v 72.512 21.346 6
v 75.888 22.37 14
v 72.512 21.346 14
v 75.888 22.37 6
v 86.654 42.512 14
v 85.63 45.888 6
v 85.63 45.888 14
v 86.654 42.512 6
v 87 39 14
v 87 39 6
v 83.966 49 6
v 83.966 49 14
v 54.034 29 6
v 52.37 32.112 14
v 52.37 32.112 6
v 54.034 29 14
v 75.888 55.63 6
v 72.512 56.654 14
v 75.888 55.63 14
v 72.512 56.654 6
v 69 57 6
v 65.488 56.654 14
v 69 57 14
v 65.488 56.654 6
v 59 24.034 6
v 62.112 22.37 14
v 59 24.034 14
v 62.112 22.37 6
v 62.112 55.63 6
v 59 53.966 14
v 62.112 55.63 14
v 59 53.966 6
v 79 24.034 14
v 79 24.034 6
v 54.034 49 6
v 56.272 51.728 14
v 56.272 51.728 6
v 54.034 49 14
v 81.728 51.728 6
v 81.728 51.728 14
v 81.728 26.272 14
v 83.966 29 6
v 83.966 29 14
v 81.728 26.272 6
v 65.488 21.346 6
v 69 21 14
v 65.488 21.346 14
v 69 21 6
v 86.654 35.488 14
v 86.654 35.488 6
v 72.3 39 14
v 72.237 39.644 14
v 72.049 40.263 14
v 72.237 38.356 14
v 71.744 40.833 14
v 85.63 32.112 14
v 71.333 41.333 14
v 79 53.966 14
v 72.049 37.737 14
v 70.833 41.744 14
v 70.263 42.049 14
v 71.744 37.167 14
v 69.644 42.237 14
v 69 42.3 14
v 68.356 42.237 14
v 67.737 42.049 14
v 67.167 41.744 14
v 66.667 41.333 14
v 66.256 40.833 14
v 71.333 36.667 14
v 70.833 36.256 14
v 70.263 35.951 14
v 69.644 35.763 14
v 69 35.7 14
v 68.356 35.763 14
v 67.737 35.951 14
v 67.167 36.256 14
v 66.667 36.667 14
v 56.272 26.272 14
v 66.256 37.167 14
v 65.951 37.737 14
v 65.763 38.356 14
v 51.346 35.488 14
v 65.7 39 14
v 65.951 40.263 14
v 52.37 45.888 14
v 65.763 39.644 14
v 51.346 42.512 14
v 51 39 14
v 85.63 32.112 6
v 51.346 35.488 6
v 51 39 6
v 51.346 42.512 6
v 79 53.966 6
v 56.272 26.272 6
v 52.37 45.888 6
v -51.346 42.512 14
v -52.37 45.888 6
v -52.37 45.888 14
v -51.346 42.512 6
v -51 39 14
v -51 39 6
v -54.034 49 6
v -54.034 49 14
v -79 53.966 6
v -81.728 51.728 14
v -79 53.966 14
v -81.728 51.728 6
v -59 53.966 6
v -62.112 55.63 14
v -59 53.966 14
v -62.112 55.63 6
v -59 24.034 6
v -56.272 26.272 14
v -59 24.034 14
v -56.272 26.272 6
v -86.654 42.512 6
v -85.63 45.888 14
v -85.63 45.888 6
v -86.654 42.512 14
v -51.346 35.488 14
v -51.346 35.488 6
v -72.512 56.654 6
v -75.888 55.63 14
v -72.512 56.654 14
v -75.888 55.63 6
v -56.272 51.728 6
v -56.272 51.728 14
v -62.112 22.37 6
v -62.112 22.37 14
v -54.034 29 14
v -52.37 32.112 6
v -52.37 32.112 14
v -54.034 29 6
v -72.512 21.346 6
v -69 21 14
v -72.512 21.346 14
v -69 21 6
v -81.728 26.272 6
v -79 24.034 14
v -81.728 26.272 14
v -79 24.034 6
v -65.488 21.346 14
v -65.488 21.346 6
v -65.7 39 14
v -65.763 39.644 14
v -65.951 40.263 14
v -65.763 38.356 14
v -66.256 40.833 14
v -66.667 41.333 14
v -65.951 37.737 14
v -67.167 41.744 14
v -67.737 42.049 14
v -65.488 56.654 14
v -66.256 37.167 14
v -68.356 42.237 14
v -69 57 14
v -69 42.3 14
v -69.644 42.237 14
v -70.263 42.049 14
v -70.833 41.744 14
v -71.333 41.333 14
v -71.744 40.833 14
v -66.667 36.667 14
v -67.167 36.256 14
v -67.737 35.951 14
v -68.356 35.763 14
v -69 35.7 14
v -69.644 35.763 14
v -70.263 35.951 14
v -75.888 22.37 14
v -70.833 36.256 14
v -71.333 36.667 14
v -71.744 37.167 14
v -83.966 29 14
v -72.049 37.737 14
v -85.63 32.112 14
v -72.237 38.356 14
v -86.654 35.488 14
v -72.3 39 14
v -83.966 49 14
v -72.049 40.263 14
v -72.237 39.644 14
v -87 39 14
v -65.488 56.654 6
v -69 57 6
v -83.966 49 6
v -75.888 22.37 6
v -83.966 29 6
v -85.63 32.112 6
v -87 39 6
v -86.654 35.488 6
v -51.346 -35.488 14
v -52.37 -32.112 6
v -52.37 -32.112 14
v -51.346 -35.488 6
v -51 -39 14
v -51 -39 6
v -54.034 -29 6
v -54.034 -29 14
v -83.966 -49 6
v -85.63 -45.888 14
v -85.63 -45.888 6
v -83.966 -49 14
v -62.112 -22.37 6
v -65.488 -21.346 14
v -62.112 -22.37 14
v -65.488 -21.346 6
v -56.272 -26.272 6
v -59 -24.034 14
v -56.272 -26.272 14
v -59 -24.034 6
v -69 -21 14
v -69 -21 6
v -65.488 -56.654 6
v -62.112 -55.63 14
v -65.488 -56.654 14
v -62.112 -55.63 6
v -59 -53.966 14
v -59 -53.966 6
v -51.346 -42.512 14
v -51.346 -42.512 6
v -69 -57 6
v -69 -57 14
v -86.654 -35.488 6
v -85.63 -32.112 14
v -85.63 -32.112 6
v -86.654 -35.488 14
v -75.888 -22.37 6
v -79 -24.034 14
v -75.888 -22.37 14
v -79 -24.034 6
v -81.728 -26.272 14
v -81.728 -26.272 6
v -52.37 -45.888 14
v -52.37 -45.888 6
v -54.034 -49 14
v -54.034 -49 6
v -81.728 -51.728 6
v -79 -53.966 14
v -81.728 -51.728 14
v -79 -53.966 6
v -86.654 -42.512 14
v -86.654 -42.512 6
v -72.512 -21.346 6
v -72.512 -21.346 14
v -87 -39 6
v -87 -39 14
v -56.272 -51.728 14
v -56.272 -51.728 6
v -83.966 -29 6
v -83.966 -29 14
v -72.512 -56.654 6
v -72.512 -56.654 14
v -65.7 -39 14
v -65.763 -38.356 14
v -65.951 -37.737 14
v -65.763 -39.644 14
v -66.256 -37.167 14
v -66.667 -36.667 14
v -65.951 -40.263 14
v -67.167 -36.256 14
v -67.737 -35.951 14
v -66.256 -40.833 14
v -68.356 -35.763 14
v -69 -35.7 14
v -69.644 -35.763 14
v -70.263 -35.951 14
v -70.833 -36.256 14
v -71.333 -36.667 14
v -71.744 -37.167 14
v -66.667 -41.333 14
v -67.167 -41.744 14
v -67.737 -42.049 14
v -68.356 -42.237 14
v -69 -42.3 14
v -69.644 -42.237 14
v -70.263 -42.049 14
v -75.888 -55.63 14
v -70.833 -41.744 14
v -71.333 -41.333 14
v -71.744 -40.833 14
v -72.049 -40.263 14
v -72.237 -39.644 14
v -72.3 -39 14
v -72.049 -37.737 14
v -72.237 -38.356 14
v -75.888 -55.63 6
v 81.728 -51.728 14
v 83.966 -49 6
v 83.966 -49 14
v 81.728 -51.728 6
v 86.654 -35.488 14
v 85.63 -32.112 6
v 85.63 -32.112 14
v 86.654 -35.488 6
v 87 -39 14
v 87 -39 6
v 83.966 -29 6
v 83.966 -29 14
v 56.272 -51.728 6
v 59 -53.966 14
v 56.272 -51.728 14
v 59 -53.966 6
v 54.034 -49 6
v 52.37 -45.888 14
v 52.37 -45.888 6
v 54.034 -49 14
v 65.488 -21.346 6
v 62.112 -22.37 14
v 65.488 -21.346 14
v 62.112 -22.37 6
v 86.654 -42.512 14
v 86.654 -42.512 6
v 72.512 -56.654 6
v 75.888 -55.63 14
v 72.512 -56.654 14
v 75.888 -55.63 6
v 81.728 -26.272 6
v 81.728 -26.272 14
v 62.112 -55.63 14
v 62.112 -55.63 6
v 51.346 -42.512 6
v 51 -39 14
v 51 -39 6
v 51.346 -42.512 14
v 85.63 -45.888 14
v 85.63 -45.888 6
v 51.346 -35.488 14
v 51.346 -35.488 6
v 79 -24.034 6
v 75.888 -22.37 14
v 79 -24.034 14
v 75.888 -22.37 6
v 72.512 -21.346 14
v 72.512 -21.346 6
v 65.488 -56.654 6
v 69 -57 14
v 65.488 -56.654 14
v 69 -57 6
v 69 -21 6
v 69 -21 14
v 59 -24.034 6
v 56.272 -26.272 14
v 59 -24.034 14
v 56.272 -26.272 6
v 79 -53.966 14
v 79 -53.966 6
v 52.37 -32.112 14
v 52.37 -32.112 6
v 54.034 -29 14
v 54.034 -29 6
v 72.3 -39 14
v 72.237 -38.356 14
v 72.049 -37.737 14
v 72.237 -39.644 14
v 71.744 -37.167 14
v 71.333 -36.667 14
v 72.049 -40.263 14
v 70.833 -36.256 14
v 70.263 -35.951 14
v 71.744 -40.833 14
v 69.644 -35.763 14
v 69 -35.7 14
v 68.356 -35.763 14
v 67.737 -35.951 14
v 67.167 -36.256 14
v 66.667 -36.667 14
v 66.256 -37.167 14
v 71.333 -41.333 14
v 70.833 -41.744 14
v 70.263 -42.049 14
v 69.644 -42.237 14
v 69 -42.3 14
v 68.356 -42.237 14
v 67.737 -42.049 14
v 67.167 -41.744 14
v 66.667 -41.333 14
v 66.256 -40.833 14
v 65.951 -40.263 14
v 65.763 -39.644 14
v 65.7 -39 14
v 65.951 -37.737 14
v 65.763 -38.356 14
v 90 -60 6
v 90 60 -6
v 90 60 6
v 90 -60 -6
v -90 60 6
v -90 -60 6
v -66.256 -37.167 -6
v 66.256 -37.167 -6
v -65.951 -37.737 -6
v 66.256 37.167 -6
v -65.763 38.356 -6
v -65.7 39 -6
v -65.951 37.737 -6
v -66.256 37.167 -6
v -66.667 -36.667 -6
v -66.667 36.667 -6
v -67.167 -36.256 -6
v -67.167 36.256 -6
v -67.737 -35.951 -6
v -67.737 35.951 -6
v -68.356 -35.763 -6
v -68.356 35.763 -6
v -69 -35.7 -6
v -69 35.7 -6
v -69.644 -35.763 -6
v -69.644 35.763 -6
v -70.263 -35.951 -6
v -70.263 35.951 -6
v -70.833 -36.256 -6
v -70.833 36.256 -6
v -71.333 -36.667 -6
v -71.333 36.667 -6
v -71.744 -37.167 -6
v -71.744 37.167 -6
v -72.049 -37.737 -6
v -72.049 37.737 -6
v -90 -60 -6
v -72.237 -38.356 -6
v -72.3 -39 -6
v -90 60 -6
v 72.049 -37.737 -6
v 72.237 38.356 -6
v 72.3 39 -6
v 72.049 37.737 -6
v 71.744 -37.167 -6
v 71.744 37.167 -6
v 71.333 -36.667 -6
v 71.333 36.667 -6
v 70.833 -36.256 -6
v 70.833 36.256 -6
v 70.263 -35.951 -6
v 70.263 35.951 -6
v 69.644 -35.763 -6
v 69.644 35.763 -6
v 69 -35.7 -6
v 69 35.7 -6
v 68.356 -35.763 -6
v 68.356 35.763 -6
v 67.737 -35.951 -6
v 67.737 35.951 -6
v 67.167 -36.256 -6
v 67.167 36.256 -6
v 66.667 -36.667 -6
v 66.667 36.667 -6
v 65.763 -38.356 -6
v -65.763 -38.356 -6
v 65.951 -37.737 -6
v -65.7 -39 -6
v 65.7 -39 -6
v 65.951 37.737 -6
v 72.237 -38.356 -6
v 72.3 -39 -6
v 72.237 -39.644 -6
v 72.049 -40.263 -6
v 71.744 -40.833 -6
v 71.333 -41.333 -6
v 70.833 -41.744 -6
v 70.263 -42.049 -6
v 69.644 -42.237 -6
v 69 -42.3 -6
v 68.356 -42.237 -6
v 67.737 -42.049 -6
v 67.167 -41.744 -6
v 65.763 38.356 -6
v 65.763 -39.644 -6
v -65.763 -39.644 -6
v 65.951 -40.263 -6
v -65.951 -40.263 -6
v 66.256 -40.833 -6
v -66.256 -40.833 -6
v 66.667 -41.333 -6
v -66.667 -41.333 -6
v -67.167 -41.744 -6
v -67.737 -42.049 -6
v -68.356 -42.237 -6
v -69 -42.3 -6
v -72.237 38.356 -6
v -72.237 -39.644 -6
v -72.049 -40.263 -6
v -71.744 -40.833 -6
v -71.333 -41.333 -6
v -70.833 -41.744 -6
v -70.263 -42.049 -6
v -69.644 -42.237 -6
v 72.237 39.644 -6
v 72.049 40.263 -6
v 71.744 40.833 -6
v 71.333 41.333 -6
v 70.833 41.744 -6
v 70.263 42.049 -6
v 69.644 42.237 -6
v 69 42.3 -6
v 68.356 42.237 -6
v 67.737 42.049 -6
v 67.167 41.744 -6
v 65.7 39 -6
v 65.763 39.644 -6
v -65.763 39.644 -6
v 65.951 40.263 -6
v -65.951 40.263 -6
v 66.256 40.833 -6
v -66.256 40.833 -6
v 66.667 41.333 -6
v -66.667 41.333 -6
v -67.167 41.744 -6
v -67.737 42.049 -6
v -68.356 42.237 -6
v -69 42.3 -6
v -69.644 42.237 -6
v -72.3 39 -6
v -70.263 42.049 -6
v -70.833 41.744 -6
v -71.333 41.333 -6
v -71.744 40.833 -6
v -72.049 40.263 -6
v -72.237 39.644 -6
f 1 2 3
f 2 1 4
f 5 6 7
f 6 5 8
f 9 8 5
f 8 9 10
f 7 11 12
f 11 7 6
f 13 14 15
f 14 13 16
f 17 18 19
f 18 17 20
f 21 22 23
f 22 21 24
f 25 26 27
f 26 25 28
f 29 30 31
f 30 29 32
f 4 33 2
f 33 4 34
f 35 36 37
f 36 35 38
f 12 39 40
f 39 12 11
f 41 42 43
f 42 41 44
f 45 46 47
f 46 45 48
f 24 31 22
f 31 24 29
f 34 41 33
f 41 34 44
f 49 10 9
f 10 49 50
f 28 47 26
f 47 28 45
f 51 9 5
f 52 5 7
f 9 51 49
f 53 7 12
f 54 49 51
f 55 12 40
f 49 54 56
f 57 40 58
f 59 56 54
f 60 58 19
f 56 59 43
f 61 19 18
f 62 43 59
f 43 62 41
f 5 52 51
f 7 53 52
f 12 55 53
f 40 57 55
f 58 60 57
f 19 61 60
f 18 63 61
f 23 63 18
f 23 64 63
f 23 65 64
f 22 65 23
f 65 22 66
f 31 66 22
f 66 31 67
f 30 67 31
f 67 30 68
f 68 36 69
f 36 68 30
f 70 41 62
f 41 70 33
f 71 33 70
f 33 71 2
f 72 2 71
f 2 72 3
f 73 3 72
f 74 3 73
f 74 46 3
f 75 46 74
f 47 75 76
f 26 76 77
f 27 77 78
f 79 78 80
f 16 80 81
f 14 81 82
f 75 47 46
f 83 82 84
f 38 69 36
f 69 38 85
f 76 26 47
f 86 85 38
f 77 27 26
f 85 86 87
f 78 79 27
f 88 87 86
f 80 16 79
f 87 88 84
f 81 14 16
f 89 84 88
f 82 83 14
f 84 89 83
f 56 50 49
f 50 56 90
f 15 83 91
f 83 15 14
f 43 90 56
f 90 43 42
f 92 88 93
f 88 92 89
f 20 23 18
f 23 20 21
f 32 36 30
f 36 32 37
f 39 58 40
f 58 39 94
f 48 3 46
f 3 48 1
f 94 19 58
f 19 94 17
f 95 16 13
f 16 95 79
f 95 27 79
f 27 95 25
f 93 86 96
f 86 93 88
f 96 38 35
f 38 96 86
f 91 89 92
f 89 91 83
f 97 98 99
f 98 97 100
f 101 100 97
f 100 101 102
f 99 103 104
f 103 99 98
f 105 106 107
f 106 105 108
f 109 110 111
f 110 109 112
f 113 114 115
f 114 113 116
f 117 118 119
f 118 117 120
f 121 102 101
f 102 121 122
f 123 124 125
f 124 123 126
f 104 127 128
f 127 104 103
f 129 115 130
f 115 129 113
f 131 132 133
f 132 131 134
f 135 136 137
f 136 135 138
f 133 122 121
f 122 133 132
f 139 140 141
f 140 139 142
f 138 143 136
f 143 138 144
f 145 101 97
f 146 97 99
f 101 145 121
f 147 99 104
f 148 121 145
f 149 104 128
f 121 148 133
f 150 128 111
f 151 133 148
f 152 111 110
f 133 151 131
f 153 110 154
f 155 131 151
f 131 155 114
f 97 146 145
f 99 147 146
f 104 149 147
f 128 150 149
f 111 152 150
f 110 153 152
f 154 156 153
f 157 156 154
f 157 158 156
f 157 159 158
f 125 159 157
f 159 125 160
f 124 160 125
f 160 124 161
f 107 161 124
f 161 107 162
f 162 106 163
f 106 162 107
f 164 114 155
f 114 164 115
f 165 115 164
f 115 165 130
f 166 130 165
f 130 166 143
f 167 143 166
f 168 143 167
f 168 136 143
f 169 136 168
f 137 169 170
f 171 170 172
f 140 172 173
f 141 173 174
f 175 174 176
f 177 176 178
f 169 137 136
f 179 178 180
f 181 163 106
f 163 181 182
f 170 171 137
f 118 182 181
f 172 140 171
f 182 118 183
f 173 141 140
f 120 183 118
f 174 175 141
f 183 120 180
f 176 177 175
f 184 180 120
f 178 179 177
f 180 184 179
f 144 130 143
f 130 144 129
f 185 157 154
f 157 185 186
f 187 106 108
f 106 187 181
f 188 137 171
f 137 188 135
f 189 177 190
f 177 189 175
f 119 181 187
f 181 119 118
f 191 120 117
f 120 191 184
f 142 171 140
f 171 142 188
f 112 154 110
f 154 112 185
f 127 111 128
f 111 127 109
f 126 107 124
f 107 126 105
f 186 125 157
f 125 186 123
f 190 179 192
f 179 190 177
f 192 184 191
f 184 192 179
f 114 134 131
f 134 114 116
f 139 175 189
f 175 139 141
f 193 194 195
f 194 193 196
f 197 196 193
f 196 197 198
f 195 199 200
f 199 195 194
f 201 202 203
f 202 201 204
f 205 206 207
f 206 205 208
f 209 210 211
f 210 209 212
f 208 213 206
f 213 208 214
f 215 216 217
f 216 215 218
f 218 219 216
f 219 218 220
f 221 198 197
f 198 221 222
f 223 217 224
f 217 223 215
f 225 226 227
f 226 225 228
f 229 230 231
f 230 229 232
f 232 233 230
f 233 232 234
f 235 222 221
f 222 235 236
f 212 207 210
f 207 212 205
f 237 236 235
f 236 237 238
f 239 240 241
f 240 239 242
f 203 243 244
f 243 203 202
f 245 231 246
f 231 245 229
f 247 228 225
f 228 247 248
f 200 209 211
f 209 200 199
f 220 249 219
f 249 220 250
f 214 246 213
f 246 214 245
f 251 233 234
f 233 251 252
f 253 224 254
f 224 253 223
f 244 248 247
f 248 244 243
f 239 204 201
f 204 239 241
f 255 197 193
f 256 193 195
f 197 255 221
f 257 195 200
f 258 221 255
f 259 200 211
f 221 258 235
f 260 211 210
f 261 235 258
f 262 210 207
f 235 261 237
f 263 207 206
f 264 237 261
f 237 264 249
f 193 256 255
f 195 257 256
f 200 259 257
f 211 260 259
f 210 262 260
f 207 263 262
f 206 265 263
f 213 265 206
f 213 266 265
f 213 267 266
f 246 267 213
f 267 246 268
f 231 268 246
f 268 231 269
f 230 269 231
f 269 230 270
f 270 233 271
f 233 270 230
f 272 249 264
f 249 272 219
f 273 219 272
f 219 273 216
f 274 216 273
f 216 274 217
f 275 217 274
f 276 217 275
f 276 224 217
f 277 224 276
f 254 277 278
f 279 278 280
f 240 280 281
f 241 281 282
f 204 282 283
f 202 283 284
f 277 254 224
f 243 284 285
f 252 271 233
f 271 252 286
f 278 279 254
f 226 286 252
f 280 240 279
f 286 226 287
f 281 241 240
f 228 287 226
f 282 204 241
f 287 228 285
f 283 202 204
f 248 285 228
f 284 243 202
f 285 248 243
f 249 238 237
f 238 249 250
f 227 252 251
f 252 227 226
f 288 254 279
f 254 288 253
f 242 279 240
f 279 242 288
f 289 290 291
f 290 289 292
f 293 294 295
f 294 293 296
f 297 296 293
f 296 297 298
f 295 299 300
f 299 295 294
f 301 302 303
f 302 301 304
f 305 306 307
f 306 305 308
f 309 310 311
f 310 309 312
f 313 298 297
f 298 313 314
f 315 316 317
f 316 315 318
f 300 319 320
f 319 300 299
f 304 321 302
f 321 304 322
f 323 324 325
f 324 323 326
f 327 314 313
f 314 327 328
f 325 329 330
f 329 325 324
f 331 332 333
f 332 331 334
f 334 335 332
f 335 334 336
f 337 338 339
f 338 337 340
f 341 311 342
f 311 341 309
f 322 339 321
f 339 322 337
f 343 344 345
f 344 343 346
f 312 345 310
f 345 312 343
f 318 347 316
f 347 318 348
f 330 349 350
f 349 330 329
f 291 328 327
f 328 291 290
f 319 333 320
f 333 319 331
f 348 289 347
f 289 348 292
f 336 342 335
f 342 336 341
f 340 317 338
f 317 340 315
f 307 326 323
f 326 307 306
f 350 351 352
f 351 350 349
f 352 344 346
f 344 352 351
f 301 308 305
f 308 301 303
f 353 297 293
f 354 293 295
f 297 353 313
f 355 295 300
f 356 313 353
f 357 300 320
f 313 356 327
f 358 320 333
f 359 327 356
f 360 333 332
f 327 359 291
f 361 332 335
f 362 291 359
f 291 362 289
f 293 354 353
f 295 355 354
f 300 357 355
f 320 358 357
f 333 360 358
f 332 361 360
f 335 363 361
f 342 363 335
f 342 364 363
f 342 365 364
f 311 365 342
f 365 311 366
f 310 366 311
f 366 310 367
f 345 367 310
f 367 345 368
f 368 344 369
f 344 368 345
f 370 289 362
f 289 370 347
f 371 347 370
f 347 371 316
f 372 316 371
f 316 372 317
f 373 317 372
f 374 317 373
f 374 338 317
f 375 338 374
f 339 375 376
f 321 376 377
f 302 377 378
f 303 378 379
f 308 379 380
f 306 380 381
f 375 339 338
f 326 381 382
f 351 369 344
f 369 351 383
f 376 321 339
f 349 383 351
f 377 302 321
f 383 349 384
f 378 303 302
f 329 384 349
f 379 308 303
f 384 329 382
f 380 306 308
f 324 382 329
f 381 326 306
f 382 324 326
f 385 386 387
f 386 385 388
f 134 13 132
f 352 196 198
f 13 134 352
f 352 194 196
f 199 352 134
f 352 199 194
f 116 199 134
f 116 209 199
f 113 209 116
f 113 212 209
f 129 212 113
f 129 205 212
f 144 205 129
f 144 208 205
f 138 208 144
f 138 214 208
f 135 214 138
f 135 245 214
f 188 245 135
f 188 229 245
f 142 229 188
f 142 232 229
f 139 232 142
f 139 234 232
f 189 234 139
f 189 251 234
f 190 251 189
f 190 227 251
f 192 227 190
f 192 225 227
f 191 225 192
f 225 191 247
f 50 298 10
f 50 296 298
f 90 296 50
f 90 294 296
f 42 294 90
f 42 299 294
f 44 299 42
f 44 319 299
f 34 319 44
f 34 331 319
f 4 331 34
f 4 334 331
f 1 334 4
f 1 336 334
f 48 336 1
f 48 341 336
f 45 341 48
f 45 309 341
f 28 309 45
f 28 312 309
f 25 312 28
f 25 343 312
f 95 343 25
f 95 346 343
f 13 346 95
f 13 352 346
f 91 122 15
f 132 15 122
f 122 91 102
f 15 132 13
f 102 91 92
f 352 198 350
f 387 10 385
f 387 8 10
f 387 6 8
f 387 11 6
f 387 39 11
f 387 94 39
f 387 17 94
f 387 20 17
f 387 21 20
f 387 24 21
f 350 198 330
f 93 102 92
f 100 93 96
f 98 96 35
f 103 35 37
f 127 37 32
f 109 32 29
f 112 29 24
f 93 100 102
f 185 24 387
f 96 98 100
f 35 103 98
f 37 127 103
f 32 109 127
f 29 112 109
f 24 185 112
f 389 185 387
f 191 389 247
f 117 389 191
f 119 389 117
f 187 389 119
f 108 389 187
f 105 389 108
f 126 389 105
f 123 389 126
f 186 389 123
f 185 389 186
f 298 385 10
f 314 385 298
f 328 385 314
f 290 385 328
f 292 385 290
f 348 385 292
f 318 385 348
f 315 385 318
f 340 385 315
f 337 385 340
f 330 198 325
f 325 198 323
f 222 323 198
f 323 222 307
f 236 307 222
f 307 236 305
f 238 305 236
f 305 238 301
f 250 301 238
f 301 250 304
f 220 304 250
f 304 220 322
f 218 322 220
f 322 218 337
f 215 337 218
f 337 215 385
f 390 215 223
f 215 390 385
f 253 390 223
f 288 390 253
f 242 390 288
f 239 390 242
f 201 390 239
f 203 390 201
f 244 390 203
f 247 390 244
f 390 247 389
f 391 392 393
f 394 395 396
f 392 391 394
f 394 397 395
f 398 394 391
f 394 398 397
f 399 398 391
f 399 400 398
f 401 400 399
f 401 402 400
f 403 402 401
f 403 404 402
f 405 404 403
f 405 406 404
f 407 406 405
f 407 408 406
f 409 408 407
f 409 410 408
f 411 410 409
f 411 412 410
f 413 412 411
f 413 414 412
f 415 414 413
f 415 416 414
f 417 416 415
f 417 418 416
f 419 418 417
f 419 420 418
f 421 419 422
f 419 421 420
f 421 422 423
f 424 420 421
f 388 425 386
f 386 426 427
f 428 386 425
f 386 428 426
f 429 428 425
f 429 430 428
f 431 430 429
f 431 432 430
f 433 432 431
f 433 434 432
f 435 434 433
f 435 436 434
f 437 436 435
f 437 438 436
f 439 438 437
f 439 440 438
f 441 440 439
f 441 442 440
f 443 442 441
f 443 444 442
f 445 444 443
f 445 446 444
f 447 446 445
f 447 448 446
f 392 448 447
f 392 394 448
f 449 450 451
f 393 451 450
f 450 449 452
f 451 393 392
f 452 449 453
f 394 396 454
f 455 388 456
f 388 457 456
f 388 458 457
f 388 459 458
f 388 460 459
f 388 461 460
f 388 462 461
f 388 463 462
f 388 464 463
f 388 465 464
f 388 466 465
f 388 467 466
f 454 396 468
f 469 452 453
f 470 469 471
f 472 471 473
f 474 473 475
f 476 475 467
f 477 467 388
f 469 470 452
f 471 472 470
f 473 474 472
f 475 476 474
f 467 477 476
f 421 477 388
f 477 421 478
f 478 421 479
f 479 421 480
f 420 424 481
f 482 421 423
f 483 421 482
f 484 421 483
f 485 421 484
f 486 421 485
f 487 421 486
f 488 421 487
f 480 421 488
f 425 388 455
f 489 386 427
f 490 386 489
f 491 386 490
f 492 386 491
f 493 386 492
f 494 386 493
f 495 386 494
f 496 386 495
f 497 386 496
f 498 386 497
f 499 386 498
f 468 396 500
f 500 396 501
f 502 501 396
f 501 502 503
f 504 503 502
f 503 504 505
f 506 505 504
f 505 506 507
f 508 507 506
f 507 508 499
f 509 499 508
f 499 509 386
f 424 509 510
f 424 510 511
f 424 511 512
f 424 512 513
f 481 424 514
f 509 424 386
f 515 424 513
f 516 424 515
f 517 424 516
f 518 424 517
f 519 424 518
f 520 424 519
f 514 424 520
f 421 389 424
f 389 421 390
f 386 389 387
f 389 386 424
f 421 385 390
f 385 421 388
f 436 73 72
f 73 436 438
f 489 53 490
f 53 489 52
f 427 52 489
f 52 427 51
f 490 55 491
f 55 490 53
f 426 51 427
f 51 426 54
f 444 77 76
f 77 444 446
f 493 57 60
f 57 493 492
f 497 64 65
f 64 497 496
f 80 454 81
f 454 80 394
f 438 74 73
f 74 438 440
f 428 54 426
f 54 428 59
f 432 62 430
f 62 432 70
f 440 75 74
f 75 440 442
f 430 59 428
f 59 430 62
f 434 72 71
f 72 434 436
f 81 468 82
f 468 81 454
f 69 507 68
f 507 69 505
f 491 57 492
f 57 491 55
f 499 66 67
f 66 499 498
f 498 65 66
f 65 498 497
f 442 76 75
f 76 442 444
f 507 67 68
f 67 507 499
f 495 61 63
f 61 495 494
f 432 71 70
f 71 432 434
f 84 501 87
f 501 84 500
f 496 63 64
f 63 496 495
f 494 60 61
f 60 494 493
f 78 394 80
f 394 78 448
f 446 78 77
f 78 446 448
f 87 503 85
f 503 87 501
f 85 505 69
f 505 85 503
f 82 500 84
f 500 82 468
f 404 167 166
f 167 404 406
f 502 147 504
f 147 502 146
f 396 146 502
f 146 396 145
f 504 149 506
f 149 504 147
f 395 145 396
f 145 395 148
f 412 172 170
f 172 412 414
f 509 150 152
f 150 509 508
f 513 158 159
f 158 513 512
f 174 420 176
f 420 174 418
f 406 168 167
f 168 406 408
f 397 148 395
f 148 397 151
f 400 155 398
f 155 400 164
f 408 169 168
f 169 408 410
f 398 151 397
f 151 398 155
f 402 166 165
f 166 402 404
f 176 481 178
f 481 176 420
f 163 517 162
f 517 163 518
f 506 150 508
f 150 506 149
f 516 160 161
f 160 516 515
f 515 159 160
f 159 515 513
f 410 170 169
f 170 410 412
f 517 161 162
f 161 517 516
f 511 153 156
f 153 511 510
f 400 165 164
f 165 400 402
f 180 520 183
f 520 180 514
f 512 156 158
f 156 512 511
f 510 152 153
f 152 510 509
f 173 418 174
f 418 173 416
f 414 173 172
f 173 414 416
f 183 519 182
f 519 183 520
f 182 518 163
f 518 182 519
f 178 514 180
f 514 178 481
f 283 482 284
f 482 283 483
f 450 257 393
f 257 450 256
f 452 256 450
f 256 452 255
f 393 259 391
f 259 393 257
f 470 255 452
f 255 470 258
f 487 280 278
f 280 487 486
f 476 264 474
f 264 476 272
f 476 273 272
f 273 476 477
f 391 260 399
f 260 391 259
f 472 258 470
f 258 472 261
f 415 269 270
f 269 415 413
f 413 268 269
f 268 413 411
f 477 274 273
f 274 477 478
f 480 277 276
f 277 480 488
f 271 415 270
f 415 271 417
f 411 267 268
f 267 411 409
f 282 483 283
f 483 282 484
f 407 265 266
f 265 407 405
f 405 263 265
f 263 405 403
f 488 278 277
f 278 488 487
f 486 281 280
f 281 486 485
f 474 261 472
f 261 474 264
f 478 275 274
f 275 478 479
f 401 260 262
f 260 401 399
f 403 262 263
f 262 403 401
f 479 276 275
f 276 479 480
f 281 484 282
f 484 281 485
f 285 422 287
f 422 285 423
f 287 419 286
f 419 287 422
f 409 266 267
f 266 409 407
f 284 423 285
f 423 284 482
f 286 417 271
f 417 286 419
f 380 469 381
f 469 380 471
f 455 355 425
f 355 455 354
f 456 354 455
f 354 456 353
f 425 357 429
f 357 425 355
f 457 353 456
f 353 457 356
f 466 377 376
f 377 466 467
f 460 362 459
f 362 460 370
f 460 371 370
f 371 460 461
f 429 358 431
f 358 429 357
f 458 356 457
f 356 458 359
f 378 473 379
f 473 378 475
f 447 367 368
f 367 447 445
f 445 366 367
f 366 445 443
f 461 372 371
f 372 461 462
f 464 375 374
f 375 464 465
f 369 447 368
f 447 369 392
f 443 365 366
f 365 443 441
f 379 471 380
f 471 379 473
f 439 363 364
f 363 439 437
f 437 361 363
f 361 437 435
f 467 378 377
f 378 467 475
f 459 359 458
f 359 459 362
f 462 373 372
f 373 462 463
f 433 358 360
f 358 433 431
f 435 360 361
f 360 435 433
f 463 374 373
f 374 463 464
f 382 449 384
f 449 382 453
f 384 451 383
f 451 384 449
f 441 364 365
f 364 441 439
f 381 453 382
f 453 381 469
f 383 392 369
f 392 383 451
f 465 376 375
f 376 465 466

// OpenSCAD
$fn = 32;

// ----------------------------------------------------------------------
// Anchor pads 180 x 120 x 20
// four corner bosses with anchor holes
// ----------------------------------------------------------------------

// --- parameters (mm) ---
plate = [180, 120, 12];  // base plate size (x, y, z)
pads = 4;                // boss count, one per corner
edge = 21;               // boss centre offset from the plate edge
boss_d = 36;             // boss diameter
boss_h = 8;              // boss height above the base plate
hole_d = 6.6;            // hole diameter

// --- derived feature positions (mm) ---
height = plate[2] + boss_h;      // = 20   overall height of the part
corner_x = plate[0] / 2 - edge;  // = 69   boss centre X
corner_y = plate[1] / 2 - edge;  // = 39   boss centre Y
feature_centers = [
  [corner_x, corner_y],
  [-corner_x, corner_y],
  [-corner_x, -corner_y],
  [corner_x, -corner_y]
];   // boss centres, anchor holes are drilled there

// base plate, four bosses standing on it, anchor holes all the way through
difference() {
  union() {
    cube(plate, center = true);
    for (centre = feature_centers)
      translate([centre[0], centre[1], plate[2] / 2 - 1])
        cylinder(d = boss_d, h = boss_h + 1);
  }
  for (centre = feature_centers)
    translate([centre[0], centre[1], -height])
      cylinder(d = hole_d, h = 2 * height + 2);  // through boss and plate
}
